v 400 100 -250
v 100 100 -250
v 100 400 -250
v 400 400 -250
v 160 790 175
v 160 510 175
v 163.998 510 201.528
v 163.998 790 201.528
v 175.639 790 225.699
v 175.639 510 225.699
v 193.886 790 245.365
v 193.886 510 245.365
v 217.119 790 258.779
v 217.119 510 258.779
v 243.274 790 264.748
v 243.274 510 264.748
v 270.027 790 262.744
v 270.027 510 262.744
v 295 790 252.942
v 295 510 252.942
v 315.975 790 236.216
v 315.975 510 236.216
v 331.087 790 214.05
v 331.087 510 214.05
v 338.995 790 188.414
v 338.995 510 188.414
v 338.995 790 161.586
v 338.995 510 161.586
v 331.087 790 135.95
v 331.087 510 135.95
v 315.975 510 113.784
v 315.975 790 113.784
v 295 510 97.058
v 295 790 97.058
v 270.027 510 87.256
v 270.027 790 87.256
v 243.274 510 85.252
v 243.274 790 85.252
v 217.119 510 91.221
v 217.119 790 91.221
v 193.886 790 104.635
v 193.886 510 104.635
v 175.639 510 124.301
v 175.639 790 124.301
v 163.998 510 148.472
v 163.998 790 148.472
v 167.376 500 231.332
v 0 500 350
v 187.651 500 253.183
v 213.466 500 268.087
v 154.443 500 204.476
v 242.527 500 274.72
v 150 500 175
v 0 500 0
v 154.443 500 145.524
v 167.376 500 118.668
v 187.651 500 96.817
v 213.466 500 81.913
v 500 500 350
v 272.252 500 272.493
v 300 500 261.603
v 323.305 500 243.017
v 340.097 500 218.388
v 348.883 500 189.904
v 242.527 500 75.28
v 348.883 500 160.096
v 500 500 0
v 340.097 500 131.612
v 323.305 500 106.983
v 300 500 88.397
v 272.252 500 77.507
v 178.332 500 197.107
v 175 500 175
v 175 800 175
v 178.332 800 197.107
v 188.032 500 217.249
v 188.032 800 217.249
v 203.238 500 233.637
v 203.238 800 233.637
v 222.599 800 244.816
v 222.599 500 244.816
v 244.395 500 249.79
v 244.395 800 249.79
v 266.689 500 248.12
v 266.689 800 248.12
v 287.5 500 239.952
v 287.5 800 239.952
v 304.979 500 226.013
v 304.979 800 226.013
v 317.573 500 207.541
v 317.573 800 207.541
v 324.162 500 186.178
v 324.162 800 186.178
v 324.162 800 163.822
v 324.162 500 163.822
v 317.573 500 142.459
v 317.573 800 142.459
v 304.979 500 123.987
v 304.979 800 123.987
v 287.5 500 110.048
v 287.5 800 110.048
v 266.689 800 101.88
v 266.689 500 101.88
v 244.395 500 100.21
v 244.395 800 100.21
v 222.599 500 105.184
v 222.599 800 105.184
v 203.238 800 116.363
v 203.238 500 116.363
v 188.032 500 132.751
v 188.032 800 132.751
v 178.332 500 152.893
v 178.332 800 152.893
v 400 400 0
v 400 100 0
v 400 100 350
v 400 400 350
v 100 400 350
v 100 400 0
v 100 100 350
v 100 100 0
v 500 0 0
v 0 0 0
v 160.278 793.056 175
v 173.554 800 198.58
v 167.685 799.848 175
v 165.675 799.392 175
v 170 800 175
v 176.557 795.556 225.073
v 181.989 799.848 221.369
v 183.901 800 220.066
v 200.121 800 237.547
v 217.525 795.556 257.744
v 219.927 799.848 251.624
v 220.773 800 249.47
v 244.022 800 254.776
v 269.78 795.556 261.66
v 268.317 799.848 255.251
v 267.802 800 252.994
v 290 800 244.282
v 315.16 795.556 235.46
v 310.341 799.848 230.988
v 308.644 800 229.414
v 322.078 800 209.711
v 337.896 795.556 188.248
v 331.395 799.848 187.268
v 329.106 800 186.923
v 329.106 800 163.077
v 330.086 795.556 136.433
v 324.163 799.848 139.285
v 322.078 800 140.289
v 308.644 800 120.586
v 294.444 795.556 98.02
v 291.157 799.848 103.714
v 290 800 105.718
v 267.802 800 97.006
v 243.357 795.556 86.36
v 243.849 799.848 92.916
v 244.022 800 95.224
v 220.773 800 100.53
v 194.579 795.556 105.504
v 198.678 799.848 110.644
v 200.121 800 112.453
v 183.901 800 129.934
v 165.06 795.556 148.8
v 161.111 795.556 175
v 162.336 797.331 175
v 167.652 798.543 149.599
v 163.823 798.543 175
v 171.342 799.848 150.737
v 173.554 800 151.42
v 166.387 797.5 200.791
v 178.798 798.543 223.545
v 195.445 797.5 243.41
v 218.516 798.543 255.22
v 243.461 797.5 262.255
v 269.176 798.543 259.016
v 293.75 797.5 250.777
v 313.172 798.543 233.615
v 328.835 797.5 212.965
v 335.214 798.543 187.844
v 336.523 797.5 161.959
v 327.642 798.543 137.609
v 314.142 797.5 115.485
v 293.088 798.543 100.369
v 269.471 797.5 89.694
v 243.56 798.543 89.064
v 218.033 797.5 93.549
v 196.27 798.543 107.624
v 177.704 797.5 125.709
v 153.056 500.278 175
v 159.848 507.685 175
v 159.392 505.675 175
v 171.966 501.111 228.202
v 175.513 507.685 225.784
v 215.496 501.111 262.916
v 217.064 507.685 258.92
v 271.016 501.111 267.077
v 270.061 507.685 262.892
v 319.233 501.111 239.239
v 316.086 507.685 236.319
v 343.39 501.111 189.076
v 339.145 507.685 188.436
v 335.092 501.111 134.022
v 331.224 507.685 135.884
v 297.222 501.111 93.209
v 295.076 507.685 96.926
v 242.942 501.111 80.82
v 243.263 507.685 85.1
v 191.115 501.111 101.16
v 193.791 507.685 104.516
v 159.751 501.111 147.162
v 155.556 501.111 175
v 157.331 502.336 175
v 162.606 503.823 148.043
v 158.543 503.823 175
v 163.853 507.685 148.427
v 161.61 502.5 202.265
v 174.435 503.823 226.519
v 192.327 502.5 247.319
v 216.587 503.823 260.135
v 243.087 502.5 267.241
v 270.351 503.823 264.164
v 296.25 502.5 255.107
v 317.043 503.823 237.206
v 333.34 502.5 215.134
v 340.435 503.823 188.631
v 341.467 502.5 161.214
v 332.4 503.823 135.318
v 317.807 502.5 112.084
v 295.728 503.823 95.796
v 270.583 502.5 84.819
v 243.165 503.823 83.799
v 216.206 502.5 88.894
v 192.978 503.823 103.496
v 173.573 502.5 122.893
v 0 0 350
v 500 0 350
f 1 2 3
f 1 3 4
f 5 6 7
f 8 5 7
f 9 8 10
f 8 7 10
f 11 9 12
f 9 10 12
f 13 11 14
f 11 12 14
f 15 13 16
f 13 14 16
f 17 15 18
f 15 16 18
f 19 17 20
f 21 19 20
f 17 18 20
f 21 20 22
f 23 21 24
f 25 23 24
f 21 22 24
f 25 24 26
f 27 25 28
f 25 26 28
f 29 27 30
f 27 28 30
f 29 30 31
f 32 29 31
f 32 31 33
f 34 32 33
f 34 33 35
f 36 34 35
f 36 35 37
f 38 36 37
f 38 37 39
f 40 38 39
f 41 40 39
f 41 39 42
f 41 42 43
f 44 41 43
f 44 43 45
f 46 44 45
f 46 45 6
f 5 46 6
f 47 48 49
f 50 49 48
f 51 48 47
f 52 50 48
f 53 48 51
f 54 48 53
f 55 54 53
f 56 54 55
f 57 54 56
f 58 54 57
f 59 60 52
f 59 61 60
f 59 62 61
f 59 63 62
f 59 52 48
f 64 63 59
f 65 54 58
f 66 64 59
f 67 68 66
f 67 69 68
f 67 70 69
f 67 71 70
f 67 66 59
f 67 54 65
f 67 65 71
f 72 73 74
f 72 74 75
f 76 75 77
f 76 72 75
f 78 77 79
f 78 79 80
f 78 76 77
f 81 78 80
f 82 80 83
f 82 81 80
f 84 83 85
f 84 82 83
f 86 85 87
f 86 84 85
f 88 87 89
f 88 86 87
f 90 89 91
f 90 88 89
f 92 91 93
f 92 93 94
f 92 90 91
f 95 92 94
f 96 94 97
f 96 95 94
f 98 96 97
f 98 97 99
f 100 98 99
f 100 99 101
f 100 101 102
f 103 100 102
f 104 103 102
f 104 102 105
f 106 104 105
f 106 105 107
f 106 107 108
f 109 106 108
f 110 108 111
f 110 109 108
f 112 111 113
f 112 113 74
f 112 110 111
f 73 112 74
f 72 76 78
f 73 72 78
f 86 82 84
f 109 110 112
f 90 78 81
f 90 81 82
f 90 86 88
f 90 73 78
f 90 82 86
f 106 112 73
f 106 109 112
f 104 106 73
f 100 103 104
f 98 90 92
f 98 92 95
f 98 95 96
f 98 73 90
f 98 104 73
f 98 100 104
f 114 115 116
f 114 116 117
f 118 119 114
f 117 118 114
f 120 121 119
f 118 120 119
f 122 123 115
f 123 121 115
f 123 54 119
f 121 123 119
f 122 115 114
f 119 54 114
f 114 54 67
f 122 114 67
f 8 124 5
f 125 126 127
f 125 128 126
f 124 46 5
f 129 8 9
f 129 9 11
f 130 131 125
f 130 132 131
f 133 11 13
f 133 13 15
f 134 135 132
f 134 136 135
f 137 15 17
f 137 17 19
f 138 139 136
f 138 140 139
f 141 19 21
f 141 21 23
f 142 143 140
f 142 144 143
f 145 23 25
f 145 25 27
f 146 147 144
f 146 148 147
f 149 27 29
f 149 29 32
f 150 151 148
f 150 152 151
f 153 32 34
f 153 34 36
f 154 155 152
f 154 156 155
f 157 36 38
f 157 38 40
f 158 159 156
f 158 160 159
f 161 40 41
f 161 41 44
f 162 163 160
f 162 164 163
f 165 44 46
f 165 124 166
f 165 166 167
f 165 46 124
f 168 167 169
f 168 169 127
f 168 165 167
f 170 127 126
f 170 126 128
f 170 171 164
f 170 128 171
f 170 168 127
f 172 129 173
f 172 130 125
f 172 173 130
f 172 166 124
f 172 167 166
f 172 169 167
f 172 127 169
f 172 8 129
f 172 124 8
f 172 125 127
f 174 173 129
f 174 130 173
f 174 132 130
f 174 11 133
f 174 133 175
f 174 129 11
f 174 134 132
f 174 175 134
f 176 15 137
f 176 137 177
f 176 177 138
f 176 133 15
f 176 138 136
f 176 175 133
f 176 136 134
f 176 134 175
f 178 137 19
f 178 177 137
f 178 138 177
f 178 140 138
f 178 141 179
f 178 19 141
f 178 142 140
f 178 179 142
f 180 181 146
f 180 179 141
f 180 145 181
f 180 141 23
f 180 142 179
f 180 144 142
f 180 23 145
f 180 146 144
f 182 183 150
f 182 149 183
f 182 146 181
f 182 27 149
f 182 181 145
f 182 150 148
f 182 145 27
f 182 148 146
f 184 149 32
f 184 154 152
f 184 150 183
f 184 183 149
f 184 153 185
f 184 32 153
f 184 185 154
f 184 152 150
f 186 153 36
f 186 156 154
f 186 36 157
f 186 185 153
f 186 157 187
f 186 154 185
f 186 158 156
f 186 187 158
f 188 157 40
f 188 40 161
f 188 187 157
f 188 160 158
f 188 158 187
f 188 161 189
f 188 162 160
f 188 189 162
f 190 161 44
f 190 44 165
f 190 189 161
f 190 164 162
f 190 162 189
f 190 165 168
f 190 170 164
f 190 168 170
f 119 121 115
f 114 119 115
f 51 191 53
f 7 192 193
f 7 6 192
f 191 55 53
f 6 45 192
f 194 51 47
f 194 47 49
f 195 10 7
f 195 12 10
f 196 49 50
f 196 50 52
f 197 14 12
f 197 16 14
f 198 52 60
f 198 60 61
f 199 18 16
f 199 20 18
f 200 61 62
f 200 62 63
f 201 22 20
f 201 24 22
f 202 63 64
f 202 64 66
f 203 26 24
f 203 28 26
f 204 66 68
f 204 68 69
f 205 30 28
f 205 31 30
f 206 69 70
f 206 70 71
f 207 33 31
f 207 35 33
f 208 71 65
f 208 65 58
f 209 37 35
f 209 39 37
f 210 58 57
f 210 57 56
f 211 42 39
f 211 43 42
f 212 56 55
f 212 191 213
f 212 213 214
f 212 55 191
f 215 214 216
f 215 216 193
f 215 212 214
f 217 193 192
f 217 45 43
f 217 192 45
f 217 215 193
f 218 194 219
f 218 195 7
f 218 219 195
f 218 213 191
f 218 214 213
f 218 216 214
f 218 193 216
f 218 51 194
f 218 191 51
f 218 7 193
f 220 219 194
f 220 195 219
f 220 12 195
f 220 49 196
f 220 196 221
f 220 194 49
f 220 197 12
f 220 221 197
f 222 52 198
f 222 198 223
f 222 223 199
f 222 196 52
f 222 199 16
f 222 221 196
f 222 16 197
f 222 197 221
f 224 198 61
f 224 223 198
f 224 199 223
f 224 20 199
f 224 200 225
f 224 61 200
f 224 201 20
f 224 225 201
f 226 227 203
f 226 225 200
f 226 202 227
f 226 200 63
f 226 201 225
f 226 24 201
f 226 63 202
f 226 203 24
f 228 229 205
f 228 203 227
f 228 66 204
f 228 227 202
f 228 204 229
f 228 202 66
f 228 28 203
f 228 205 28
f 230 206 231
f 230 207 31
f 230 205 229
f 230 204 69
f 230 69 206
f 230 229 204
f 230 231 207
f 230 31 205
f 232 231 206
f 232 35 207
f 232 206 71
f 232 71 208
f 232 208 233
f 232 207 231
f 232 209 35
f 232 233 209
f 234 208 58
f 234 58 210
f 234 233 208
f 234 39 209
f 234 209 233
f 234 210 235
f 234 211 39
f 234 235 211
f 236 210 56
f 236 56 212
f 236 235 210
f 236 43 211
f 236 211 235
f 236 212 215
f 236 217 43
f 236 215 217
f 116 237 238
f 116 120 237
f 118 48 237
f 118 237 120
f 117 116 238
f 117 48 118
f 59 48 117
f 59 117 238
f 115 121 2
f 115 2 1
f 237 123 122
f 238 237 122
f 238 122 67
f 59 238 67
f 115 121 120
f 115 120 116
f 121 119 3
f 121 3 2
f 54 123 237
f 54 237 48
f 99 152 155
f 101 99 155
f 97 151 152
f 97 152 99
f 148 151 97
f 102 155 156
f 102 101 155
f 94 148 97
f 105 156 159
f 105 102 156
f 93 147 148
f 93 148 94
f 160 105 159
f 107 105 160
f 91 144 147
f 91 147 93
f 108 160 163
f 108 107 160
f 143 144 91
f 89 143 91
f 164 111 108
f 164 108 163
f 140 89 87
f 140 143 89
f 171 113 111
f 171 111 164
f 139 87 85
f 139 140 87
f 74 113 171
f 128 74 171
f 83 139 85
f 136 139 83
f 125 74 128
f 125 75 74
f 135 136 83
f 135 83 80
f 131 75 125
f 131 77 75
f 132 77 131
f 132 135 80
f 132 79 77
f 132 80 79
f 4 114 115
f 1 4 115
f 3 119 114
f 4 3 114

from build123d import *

# Parameters (mm, degrees)
F0_W     = 500
F0_H     = 500
F0_W_2   = 300
F0_H_2   = 300
F1_DEPTH = 350
F2_W     = 300
F2_H     = 300
F3_DEPTH = 250
F4_R     = 90
F4_R_2   = 75
F5_DEPTH = 300


# Not quite as in the source:
# - a fillet or chamfer that OpenCascade refuses, or shapes differently, is made with other operations: its cross-section is extruded or revolved along the edge and cut away or added


with BuildPart() as f1:
    # F0 (on Top) → F1 (new body)
    with BuildSketch(Plane.XY):
        with Locations((250, 250)):
            Rectangle(F0_W, F0_H)
        with Locations((250, 250)):
            Rectangle(F0_W_2, F0_H_2, mode=Mode.SUBTRACT)
    extrude(amount=F1_DEPTH)

    # F4 (on face) → F5 (join)
    with BuildSketch(Plane(origin=(0, 500, 0), x_dir=(-1, 0, 0), z_dir=(0, 1, 0))):
        with Locations((-250, 175)):
            Circle(F4_R)
        with Locations((-250, 175)):
            Circle(F4_R_2, mode=Mode.SUBTRACT)
    extrude(amount=F5_DEPTH)

    # F6: fillet of radius 10 on 3 edges, made by hand

    # F6_s1 → F6_t2 (revolve)
    with BuildSketch(Plane.XY.offset(175)):
        with BuildLine():
            add(Edge.make_bspline(
                [(150, 500), (160, 500), (160, 510)],
                knots=[0, 0, 0, 1, 1, 1], degree=2, weights=[1, 1, 1]))
            Line((160, 510), (160, 500))
            Line((160, 500), (150, 500))
        make_face()
    revolve(axis=Axis((250, 500, 175), (0, 1, 0)))

    # F6_s3 → F6_t4 (revolve, cut)
    with BuildSketch(Plane.XY.offset(175)):
        with BuildLine():
            add(Edge.make_bspline(
                [(160, 790), (160, 800), (170, 800)],
                knots=[0, 0, 0, 1, 1, 1], degree=2, weights=[1, 1, 1]))
            Line((170, 800), (160, 800))
            Line((160, 800), (160, 790))
        make_face()
    revolve(axis=Axis((250, 800, 175), (0, 1, 0)), mode=Mode.SUBTRACT)


with BuildPart() as f3:
    # F2 (on face) → F3 (new body)
    with BuildSketch(Plane(origin=(0, 0, 0), x_dir=(1, 0, 0), z_dir=(0, 0, -1))):
        with Locations((250, -250)):
            Rectangle(F2_W, F2_H)
    extrude(amount=F3_DEPTH)


solid = Compound([f1.part, f3.part])
